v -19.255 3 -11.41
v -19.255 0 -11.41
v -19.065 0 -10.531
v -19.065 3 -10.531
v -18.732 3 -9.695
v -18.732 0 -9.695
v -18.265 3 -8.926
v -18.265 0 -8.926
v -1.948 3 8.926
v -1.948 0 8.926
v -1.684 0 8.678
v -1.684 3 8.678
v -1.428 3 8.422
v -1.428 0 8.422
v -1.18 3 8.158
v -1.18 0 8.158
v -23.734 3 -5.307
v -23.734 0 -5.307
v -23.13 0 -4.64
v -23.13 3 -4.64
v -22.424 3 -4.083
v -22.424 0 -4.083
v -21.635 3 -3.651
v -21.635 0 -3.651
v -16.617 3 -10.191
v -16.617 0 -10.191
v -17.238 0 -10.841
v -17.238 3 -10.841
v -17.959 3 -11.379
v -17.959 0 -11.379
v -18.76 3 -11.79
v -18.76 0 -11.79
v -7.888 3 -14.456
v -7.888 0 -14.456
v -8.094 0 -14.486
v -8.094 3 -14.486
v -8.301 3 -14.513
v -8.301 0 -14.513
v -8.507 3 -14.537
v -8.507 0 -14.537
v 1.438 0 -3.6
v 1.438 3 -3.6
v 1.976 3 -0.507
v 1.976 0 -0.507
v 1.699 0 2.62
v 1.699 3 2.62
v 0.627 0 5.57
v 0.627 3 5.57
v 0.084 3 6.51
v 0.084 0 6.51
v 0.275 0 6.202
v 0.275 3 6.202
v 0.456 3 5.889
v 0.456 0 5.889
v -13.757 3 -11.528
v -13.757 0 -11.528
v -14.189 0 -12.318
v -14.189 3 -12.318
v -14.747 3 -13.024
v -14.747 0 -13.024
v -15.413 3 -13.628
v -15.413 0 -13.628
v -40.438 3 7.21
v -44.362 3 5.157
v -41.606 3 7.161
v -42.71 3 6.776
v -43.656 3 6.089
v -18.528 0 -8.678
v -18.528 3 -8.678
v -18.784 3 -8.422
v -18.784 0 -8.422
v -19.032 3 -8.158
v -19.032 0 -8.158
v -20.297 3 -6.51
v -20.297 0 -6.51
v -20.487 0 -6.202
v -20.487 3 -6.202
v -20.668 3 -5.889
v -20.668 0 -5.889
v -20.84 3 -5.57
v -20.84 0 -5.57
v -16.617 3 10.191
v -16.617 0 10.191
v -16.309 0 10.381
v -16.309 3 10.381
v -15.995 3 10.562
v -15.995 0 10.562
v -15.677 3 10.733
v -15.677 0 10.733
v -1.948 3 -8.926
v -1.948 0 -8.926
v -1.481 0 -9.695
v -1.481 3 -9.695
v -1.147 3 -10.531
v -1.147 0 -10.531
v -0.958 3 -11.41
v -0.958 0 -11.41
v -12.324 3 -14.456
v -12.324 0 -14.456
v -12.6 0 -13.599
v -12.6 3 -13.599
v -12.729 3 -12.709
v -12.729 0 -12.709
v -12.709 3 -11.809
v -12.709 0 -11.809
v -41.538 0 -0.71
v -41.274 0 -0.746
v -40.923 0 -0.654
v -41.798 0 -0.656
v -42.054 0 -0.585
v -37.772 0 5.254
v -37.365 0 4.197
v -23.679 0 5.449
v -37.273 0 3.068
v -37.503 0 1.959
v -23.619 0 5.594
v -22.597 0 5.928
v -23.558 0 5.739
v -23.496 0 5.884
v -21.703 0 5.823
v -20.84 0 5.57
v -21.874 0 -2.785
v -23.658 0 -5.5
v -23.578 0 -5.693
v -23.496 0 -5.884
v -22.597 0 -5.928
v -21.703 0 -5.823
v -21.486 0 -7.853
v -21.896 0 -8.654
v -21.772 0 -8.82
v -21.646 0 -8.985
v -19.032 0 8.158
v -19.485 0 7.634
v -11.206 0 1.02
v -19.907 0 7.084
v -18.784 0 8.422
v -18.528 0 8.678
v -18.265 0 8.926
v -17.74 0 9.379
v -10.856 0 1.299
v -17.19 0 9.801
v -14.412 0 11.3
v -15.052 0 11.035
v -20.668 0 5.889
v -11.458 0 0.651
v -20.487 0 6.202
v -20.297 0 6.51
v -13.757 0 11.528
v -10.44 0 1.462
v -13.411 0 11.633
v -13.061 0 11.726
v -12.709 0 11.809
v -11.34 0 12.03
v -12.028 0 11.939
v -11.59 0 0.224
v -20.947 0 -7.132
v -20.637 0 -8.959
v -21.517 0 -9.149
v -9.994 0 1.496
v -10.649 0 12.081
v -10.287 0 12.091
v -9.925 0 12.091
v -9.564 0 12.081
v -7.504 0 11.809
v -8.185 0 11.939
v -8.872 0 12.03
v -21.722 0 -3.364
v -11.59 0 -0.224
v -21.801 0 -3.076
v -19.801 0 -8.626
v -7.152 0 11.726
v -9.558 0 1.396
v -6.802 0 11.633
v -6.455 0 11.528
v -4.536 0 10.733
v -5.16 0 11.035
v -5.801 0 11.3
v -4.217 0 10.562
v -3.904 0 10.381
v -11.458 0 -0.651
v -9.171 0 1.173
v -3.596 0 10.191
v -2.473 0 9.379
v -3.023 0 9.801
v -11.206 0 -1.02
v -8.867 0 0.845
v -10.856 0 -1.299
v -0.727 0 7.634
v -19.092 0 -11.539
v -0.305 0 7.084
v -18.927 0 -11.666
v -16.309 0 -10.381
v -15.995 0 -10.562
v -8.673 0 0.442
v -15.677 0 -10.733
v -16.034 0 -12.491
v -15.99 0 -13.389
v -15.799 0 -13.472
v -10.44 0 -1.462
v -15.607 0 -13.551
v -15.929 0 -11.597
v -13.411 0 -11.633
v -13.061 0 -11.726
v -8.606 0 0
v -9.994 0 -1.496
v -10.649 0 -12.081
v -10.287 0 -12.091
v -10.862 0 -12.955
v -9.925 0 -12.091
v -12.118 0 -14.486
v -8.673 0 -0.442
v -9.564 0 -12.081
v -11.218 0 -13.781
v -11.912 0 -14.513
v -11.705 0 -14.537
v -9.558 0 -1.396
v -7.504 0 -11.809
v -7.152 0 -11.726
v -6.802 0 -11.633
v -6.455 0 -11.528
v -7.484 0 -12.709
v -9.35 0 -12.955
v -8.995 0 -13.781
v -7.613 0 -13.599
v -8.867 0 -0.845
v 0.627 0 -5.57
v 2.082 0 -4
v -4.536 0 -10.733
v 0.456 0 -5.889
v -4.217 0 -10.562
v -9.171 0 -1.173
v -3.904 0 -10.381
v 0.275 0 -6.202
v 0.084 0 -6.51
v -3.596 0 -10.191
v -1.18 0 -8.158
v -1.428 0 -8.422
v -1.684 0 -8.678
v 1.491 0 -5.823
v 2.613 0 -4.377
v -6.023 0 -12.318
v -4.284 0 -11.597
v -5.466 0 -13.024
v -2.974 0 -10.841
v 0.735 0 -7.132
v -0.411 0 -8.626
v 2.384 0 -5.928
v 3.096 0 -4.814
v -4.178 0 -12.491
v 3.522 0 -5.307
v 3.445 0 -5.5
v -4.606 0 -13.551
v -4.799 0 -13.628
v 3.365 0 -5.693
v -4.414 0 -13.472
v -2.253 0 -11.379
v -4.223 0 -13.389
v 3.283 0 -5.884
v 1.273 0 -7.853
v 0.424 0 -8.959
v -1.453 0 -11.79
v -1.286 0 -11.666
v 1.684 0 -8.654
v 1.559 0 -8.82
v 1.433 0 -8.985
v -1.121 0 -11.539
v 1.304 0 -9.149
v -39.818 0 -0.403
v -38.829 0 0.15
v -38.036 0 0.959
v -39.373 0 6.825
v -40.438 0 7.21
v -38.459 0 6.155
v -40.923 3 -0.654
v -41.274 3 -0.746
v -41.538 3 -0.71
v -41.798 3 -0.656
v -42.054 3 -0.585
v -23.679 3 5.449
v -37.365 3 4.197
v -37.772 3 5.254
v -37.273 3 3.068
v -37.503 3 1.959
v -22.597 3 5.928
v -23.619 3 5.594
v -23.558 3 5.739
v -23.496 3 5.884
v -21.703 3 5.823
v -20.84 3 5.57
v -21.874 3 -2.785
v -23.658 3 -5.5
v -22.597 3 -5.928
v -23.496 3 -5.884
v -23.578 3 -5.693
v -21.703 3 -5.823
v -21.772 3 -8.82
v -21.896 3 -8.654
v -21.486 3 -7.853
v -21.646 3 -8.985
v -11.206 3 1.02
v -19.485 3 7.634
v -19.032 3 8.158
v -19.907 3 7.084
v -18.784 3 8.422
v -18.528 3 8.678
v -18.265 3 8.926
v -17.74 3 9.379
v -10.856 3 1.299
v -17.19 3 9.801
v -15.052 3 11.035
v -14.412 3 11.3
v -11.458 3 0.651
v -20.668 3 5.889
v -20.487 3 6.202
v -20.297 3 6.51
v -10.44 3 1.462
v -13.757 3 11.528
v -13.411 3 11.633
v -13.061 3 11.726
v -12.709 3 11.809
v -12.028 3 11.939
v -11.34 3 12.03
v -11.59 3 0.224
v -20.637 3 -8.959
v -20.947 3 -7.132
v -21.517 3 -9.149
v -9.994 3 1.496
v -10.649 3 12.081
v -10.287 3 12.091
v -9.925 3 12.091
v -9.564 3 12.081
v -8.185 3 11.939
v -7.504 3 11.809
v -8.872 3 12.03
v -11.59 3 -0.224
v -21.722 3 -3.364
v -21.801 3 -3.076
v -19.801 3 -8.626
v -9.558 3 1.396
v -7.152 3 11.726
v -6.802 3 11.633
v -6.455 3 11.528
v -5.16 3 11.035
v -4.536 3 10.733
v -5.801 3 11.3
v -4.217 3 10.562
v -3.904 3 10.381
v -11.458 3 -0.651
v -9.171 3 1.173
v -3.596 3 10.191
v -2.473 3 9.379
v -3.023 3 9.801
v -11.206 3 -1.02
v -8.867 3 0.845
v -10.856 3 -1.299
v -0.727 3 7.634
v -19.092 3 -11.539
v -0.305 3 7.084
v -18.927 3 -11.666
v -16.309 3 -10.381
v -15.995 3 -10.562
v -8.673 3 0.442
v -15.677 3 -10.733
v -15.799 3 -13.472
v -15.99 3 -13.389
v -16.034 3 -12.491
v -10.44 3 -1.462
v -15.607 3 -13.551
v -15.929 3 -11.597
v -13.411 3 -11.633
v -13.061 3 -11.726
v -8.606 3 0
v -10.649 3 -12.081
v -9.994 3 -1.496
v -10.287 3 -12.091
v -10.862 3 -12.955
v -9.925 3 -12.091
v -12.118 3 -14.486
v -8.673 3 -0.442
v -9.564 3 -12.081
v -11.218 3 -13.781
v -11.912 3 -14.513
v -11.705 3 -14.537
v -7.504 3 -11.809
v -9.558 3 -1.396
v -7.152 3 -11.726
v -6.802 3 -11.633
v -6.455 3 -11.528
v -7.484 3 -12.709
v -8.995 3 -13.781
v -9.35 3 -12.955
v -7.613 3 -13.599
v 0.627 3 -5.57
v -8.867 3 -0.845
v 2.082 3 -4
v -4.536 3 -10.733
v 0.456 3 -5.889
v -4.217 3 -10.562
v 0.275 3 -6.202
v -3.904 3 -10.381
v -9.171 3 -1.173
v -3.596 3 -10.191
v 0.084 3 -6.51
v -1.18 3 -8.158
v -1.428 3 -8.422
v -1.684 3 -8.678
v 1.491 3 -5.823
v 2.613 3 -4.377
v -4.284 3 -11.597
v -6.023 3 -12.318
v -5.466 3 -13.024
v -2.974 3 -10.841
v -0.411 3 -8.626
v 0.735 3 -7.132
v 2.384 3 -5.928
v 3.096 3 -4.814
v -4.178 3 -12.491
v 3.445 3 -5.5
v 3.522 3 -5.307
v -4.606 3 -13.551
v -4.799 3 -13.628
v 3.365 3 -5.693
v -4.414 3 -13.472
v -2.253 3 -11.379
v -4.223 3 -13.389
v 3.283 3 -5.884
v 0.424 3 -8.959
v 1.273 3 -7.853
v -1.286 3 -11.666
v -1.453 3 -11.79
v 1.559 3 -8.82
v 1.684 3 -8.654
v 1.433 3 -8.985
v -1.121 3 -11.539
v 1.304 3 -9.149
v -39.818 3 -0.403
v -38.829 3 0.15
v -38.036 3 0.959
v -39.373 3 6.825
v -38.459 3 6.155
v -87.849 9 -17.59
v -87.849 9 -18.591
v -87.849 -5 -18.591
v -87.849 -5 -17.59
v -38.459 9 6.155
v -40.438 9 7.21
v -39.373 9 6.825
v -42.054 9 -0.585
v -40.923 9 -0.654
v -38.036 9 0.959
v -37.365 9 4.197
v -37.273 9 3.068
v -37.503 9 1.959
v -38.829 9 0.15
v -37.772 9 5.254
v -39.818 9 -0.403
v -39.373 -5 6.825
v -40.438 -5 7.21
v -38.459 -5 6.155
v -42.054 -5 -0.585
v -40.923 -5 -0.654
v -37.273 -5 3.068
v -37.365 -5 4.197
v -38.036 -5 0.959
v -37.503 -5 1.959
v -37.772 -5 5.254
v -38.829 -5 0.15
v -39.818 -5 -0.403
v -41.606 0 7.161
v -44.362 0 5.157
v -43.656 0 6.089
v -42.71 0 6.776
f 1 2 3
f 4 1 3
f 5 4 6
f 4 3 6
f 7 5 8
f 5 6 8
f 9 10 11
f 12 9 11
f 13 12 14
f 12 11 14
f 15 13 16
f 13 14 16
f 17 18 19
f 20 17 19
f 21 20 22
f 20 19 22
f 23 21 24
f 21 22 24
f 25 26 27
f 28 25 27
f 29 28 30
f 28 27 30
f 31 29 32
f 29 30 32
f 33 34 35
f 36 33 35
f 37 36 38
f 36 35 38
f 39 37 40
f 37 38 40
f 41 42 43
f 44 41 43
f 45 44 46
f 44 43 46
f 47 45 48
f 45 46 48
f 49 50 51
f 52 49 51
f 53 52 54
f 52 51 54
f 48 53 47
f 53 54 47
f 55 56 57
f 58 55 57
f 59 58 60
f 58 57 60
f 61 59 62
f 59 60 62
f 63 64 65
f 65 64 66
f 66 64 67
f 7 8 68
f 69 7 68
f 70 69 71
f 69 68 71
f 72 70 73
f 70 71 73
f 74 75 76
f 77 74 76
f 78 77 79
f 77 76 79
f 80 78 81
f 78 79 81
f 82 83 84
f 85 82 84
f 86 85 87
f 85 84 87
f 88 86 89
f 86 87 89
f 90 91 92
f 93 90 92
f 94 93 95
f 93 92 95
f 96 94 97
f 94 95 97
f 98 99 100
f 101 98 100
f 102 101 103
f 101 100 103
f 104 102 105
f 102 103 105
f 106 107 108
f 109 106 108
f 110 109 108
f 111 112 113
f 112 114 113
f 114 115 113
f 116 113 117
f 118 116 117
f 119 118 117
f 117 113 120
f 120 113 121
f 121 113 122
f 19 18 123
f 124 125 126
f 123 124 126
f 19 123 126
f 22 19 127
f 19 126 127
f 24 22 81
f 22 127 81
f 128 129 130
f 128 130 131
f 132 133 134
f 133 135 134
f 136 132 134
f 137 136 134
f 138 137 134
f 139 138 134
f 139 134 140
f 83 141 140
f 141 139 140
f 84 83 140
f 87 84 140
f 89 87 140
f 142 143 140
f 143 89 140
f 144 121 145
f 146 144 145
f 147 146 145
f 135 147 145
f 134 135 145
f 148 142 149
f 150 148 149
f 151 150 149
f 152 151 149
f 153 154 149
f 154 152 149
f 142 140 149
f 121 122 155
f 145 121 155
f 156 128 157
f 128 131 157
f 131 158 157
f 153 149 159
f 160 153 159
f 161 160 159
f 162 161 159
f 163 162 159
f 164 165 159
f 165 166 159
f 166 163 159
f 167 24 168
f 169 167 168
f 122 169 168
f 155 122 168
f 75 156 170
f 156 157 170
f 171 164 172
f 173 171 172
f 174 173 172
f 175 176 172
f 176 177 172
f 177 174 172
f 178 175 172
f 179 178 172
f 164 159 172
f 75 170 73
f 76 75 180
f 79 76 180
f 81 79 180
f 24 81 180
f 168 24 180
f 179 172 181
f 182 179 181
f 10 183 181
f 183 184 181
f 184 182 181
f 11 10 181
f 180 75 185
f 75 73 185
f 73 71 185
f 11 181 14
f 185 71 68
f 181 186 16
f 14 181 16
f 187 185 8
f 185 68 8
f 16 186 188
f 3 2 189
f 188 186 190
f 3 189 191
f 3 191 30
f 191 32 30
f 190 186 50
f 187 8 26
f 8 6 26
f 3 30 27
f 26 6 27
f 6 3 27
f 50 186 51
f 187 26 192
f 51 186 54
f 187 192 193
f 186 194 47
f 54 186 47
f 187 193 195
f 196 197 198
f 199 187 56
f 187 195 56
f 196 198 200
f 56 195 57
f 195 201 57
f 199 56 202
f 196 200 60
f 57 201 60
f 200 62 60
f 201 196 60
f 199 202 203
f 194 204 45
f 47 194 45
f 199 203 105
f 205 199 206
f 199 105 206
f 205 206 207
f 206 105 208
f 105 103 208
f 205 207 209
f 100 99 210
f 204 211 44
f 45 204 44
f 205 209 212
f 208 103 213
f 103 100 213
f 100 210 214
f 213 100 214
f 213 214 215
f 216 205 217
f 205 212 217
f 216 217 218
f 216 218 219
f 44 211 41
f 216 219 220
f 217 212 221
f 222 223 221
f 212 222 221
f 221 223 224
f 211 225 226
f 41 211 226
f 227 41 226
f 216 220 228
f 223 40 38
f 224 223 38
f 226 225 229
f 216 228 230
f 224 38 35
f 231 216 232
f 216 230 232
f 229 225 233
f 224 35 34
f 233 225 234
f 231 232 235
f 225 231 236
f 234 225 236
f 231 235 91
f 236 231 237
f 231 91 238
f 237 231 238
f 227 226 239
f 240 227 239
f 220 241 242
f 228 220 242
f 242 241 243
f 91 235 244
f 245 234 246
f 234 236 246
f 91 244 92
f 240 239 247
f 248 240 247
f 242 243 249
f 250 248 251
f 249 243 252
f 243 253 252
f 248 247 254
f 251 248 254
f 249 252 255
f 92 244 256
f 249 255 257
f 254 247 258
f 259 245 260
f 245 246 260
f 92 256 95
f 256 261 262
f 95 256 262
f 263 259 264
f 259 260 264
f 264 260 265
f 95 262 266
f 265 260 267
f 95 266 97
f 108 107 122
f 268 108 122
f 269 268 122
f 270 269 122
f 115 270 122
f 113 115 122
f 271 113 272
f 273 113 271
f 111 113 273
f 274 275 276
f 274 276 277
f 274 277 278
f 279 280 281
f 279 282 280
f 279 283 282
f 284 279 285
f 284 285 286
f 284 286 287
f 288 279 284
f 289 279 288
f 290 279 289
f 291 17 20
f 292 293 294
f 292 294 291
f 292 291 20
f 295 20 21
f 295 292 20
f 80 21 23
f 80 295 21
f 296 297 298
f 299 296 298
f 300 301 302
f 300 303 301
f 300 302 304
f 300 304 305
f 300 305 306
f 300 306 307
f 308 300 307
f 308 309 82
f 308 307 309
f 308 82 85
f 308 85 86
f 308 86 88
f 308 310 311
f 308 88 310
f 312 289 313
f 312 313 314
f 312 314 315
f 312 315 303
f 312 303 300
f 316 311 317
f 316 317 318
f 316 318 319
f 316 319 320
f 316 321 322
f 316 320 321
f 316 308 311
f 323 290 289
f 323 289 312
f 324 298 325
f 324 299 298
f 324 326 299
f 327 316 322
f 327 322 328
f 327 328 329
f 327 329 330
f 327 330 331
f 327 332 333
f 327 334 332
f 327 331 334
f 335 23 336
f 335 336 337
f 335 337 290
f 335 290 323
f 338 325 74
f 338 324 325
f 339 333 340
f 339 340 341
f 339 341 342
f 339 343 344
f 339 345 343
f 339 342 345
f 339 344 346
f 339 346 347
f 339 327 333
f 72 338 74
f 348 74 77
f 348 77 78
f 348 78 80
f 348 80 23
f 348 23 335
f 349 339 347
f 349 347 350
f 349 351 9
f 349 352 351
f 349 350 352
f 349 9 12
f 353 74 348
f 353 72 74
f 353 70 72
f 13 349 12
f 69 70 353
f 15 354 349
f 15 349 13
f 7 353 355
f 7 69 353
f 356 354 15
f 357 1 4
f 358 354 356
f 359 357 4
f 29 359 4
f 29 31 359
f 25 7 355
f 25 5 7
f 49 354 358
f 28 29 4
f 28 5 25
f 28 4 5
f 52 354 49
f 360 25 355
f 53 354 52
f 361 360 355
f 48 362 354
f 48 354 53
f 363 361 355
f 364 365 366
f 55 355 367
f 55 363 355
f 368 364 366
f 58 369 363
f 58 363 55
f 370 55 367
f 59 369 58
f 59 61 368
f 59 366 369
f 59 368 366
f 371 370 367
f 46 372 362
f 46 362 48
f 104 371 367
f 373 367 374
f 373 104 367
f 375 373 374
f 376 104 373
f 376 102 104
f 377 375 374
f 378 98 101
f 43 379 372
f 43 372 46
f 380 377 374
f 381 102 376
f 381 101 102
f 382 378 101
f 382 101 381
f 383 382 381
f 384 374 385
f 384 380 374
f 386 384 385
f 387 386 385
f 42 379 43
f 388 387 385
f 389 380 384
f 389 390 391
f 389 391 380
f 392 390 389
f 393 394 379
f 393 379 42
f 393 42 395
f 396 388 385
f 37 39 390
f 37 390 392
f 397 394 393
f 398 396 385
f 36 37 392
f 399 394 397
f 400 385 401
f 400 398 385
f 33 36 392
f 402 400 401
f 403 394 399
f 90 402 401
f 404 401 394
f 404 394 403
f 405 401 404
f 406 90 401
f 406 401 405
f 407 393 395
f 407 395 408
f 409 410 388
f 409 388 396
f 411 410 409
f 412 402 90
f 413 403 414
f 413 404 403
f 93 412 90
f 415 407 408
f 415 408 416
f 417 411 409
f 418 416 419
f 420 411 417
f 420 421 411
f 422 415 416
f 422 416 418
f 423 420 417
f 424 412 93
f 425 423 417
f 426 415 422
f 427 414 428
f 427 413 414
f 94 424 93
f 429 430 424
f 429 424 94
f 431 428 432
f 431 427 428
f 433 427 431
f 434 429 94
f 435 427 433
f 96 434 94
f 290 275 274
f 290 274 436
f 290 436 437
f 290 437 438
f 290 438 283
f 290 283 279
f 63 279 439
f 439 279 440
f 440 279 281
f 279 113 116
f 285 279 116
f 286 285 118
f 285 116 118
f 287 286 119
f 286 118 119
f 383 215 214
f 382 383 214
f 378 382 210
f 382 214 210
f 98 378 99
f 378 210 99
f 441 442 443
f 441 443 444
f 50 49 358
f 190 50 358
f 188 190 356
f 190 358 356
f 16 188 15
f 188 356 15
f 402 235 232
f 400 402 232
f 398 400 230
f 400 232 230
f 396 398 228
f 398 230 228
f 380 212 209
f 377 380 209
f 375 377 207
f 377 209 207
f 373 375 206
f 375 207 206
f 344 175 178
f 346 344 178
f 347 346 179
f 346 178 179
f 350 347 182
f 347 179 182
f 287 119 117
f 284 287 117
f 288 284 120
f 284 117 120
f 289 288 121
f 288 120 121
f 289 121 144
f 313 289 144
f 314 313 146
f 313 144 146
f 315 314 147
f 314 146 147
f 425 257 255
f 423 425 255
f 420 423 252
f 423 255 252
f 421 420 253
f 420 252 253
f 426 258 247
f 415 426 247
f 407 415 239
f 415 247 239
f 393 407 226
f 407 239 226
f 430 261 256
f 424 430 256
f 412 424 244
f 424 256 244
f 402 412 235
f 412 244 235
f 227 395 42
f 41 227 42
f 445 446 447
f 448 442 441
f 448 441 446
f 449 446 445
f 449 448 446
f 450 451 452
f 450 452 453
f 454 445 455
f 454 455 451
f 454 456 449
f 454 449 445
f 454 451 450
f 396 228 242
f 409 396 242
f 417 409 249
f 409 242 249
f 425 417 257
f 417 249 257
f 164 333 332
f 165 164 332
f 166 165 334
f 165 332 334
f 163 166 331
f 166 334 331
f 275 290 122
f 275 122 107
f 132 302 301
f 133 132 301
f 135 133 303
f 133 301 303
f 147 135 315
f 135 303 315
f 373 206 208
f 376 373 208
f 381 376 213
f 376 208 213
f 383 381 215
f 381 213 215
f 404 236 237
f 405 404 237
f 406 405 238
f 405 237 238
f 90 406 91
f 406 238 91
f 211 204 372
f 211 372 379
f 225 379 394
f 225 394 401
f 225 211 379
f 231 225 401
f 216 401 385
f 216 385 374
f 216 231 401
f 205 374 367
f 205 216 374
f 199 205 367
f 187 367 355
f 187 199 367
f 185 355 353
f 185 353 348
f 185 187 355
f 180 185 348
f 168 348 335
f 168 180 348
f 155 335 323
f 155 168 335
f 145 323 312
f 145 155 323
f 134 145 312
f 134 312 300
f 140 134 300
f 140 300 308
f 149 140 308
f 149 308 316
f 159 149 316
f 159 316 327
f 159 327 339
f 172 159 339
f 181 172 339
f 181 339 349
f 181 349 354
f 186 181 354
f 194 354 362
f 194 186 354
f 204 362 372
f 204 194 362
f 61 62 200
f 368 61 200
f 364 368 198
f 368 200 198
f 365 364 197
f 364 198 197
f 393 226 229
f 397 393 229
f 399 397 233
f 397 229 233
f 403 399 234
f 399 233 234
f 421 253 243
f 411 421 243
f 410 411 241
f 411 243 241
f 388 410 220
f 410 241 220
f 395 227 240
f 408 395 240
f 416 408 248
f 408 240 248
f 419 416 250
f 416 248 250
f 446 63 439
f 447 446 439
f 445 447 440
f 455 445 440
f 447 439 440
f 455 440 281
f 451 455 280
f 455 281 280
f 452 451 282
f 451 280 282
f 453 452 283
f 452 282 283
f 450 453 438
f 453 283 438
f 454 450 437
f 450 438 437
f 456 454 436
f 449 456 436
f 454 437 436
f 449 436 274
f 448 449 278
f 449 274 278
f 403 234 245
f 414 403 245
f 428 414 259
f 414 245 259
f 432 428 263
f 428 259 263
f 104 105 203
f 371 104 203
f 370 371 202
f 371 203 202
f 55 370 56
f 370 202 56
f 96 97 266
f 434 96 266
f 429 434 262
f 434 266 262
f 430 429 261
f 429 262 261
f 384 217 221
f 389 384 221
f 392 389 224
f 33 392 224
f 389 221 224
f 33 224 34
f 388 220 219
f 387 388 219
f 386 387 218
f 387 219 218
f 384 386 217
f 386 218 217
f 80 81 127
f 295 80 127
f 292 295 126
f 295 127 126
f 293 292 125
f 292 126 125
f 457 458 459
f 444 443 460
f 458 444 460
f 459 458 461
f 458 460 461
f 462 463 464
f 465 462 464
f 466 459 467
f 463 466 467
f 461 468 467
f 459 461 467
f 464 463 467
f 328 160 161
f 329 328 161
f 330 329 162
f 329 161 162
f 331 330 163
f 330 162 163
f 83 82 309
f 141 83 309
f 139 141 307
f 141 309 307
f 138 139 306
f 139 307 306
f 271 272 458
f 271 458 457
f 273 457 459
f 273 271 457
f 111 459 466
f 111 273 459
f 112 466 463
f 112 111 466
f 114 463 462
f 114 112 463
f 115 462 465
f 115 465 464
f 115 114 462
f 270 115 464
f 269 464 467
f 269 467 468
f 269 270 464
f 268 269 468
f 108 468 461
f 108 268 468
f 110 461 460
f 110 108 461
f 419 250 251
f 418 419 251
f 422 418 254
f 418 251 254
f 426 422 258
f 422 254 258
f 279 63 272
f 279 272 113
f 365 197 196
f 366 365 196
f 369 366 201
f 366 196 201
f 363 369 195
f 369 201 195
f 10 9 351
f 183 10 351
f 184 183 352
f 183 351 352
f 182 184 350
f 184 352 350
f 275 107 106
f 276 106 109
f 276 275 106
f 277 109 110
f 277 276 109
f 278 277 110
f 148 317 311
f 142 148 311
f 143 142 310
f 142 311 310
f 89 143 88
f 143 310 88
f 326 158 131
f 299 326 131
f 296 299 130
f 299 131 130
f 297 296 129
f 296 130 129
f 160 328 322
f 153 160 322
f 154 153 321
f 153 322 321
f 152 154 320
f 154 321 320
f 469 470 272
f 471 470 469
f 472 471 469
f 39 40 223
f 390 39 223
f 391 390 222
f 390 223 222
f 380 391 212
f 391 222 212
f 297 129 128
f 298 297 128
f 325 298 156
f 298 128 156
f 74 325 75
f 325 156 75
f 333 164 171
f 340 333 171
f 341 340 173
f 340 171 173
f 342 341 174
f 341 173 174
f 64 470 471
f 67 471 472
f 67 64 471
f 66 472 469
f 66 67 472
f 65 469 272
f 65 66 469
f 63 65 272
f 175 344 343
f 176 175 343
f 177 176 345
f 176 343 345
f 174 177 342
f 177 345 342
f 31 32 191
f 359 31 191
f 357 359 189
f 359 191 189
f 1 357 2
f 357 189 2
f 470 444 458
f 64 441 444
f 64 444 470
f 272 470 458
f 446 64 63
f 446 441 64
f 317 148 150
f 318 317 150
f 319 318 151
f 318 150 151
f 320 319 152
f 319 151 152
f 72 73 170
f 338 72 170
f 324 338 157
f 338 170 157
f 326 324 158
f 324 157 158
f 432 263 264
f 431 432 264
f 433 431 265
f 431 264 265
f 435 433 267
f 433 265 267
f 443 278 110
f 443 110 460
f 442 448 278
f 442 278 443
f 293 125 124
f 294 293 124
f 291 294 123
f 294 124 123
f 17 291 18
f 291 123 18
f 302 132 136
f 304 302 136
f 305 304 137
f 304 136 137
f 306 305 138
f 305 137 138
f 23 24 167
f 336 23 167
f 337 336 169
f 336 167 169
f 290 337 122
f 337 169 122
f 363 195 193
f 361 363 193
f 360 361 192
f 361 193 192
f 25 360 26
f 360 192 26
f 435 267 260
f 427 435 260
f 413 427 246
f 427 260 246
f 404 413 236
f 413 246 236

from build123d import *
from build123d.topology import SkipClean

# Parameters (mm, degrees)
SKETCH1_R                = 1.5
BOSS_EXTRUDE1_DEPTH      = 3
BOSS_EXTRUDE2_START      = -3
SKETCH3_R                = 1.5
BOSS_EXTRUDE2_DEPTH      = 3
CUT_EXTRUDE1_START       = -3
CUT_EXTRUDE1_DEPTH       = 3
BOSS_EXTRUDE3_DEPTH      = 6
BOSS_EXTRUDE3_DEPTH_BACK = 8


with BuildPart() as part:
    # Sketch1 → Boss-Extrude1 (new body)
    with BuildSketch(Plane(origin=(0, 0, 0), x_dir=(1, 0, 0), z_dir=(0, 1, 0))):
        with BuildLine():
            Line((20.643657446, 4), (2.081641936, 4))
            ThreePointArc((2.081641936, 4), (2.861028333, 4.588201733), (3.521749436, 5.30713988))
            ThreePointArc((3.521749436, 5.30713988), (3.405395609, 5.596745198), (3.282888305, 5.883801663))
            ThreePointArc((3.282888305, 5.883801663), (1.93527598, 5.894040025), (0.627094961, 5.57027124))
            ThreePointArc((0.627094961, 5.57027124), (0.366286148, 6.046375), (0.084372603, 6.510293938))
            ThreePointArc((0.084372603, 6.510293938), (1.018855105, 7.48132754), (1.683794586, 8.65351323))
            ThreePointArc((1.683794586, 8.65351323), (1.496450048, 8.903135899), (1.303821399, 9.148703928))
            ThreePointArc((1.303821399, 9.148703928), (-0.000522033, 8.809805691), (-1.180330337, 8.158486898))
            ThreePointArc((-1.180330337, 8.158486898), (-1.555477026, 8.550865528), (-1.947855656, 8.926012217))
            ThreePointArc((-1.947855656, 8.926012217), (-1.296536862, 10.105820521), (-0.957638625, 11.410163953))
            ThreePointArc((-0.957638625, 11.410163953), (-1.203206655, 11.602792602), (-1.452829324, 11.79013714))
            ThreePointArc((-1.452829324, 11.79013714), (-2.625015014, 11.125197659), (-3.596048616, 10.190715157))
            ThreePointArc((-3.596048616, 10.190715157), (-4.059967554, 10.472628702), (-4.536071314, 10.733437515))
            ThreePointArc((-4.536071314, 10.733437515), (-4.212302529, 12.041618533), (-4.222540891, 13.389230859))
            ThreePointArc((-4.222540891, 13.389230859), (-4.509597355, 13.511738163), (-4.799202674, 13.62809199))
            ThreePointArc((-4.799202674, 13.62809199), (-5.759348103, 12.682425791), (-6.455432668, 11.528463019))
            ThreePointArc((-6.455432668, 11.528463019), (-6.976508546, 11.680699536), (-7.503891752, 11.809396783))
            ThreePointArc((-7.503891752, 11.809396783), (-7.529737283, 13.156800143), (-7.888414517, 14.455843809))
            ThreePointArc((-7.888414517, 14.455843809), (-8.197396993, 14.499881098), (-8.507248835, 14.537314892))
            ThreePointArc((-8.507248835, 14.537314892), (-9.18992168, 13.375367565), (-9.563620196, 12.080565177))
            ThreePointArc((-9.563620196, 12.080565177), (-10.106342554, 12.09275), (-10.649064912, 12.080565177))
            ThreePointArc((-10.649064912, 12.080565177), (-11.022763428, 13.375367565), (-11.705436272, 14.537314892))
            ThreePointArc((-11.705436272, 14.537314892), (-12.015288115, 14.499881098), (-12.324270591, 14.455843809))
            ThreePointArc((-12.324270591, 14.455843809), (-12.682947825, 13.156800143), (-12.708793355, 11.809396783))
            ThreePointArc((-12.708793355, 11.809396783), (-13.236176561, 11.680699536), (-13.757252439, 11.528463019))
            ThreePointArc((-13.757252439, 11.528463019), (-14.453337005, 12.682425791), (-15.413482434, 13.62809199))
            ThreePointArc((-15.413482434, 13.62809199), (-15.703087752, 13.511738163), (-15.990144217, 13.389230859))
            ThreePointArc((-15.990144217, 13.389230859), (-16.000382579, 12.041618533), (-15.676613793, 10.733437515))
            ThreePointArc((-15.676613793, 10.733437515), (-16.152717554, 10.472628702), (-16.616636492, 10.190715157))
            ThreePointArc((-16.616636492, 10.190715157), (-17.587670094, 11.125197659), (-18.759855783, 11.79013714))
            ThreePointArc((-18.759855783, 11.79013714), (-19.009478453, 11.602792602), (-19.255046482, 11.410163953))
            ThreePointArc((-19.255046482, 11.410163953), (-18.916148245, 10.105820521), (-18.264829452, 8.926012217))
            ThreePointArc((-18.264829452, 8.926012217), (-18.657208082, 8.550865528), (-19.032354771, 8.158486898))
            ThreePointArc((-19.032354771, 8.158486898), (-20.212163074, 8.809805691), (-21.516506507, 9.148703928))
            ThreePointArc((-21.516506507, 9.148703928), (-21.709135156, 8.903135899), (-21.896479694, 8.65351323))
            ThreePointArc((-21.896479694, 8.65351323), (-21.231540213, 7.48132754), (-20.297057711, 6.510293938))
            ThreePointArc((-20.297057711, 6.510293938), (-20.578971255, 6.046375), (-20.839780068, 5.57027124))
            ThreePointArc((-20.839780068, 5.57027124), (-22.147961087, 5.894040025), (-23.495573413, 5.883801663))
            ThreePointArc((-23.495573413, 5.883801663), (-23.618080717, 5.596745198), (-23.734434544, 5.30713988))
            ThreePointArc((-23.734434544, 5.30713988), (-22.788768345, 4.346994451), (-21.634805572, 3.650909885))
            ThreePointArc((-21.634805572, 3.650909885), (-21.78704209, 3.129834008), (-21.915739337, 2.602450802))
            ThreePointArc((-21.915739337, 2.602450802), (-23.263142697, 2.576605271), (-24.562186363, 2.217928037))
            ThreePointArc((-24.562186363, 2.217928037), (-24.606223651, 1.908945561), (-24.643657446, 1.599093719))
            ThreePointArc((-24.643657446, 1.599093719), (-23.481710119, 0.916420874), (-22.186907731, 0.542722358))
            ThreePointArc((-22.186907731, 0.542722358), (-22.199092554, 0), (-22.186907731, -0.542722358))
            ThreePointArc((-22.186907731, -0.542722358), (-23.481710119, -0.916420874), (-24.643657446, -1.599093719))
            ThreePointArc((-24.643657446, -1.599093719), (-24.606223651, -1.908945561), (-24.562186363, -2.217928037))
            ThreePointArc((-24.562186363, -2.217928037), (-23.263142697, -2.576605271), (-21.915739337, -2.602450802))
            ThreePointArc((-21.915739337, -2.602450802), (-21.78704209, -3.129834008), (-21.634805572, -3.650909885))
            ThreePointArc((-21.634805572, -3.650909885), (-22.788768345, -4.346994451), (-23.734434544, -5.30713988))
            ThreePointArc((-23.734434544, -5.30713988), (-23.618080717, -5.596745198), (-23.495573413, -5.883801663))
            ThreePointArc((-23.495573413, -5.883801663), (-22.147961087, -5.894040025), (-20.839780068, -5.57027124))
            ThreePointArc((-20.839780068, -5.57027124), (-20.578971255, -6.046375), (-20.297057711, -6.510293938))
            ThreePointArc((-20.297057711, -6.510293938), (-21.231540213, -7.48132754), (-21.896479694, -8.65351323))
            ThreePointArc((-21.896479694, -8.65351323), (-21.709135156, -8.903135899), (-21.516506507, -9.148703928))
            ThreePointArc((-21.516506507, -9.148703928), (-20.212163074, -8.809805691), (-19.032354771, -8.158486898))
            ThreePointArc((-19.032354771, -8.158486898), (-18.657208082, -8.550865528), (-18.264829452, -8.926012217))
            ThreePointArc((-18.264829452, -8.926012217), (-18.916148245, -10.105820521), (-19.255046482, -11.410163953))
            ThreePointArc((-19.255046482, -11.410163953), (-19.009478453, -11.602792602), (-18.759855783, -11.79013714))
            ThreePointArc((-18.759855783, -11.79013714), (-17.587670094, -11.125197659), (-16.616636492, -10.190715157))
            ThreePointArc((-16.616636492, -10.190715157), (-16.152717554, -10.472628702), (-15.676613793, -10.733437515))
            ThreePointArc((-15.676613793, -10.733437515), (-16.000382579, -12.041618533), (-15.990144217, -13.389230859))
            ThreePointArc((-15.990144217, -13.389230859), (-15.703087752, -13.511738163), (-15.413482434, -13.62809199))
            ThreePointArc((-15.413482434, -13.62809199), (-14.453337005, -12.682425791), (-13.757252439, -11.528463019))
            ThreePointArc((-13.757252439, -11.528463019), (-13.236176561, -11.680699536), (-12.708793355, -11.809396783))
            ThreePointArc((-12.708793355, -11.809396783), (-12.682947825, -13.156800143), (-12.324270591, -14.455843809))
            ThreePointArc((-12.324270591, -14.455843809), (-12.015288115, -14.499881098), (-11.705436272, -14.537314892))
            ThreePointArc((-11.705436272, -14.537314892), (-11.022763428, -13.375367565), (-10.649064912, -12.080565177))
            ThreePointArc((-10.649064912, -12.080565177), (-10.106342554, -12.09275), (-9.563620196, -12.080565177))
            ThreePointArc((-9.563620196, -12.080565177), (-9.18992168, -13.375367565), (-8.507248835, -14.537314892))
            ThreePointArc((-8.507248835, -14.537314892), (-8.197396993, -14.499881098), (-7.888414517, -14.455843809))
            ThreePointArc((-7.888414517, -14.455843809), (-7.529737283, -13.156800143), (-7.503891752, -11.809396783))
            ThreePointArc((-7.503891752, -11.809396783), (-6.976508546, -11.680699536), (-6.455432668, -11.528463019))
            ThreePointArc((-6.455432668, -11.528463019), (-5.759348103, -12.682425791), (-4.799202674, -13.62809199))
            ThreePointArc((-4.799202674, -13.62809199), (-4.509597355, -13.511738163), (-4.222540891, -13.389230859))
            ThreePointArc((-4.222540891, -13.389230859), (-4.212302529, -12.041618533), (-4.536071314, -10.733437515))
            ThreePointArc((-4.536071314, -10.733437515), (-4.059967554, -10.472628702), (-3.596048616, -10.190715157))
            ThreePointArc((-3.596048616, -10.190715157), (-2.625015014, -11.125197659), (-1.452829324, -11.79013714))
            ThreePointArc((-1.452829324, -11.79013714), (-1.203206655, -11.602792602), (-0.957638625, -11.410163953))
            ThreePointArc((-0.957638625, -11.410163953), (-1.296536862, -10.105820521), (-1.947855656, -8.926012217))
            ThreePointArc((-1.947855656, -8.926012217), (-1.555477026, -8.550865528), (-1.180330337, -8.158486898))
            ThreePointArc((-1.180330337, -8.158486898), (-0.000522033, -8.809805691), (1.303821399, -9.148703928))
            ThreePointArc((1.303821399, -9.148703928), (1.496450048, -8.903135899), (1.683794586, -8.65351323))
            ThreePointArc((1.683794586, -8.65351323), (1.018855105, -7.48132754), (0.084372603, -6.510293938))
            ThreePointArc((0.084372603, -6.510293938), (0.366286148, -6.046375), (0.627094961, -5.57027124))
            ThreePointArc((0.627094961, -5.57027124), (1.93527598, -5.894040025), (3.282888305, -5.883801663))
            ThreePointArc((3.282888305, -5.883801663), (3.405395609, -5.596745198), (3.521749436, -5.30713988))
            ThreePointArc((3.521749436, -5.30713988), (2.861028333, -4.588201733), (2.081641936, -4))
            Line((2.081641936, -4), (20.643657446, -4))
            ThreePointArc((20.643657446, -4), (24.643657446, 0), (20.643657446, 4))
        make_face()
        with Locations((-10.106342554, 0)):
            Circle(SKETCH1_R, mode=Mode.SUBTRACT)
        with Locations((20.643657446, 0)):
            Circle(SKETCH1_R, mode=Mode.SUBTRACT)
    extrude(amount=BOSS_EXTRUDE1_DEPTH)

    # Sketch3 → Boss-Extrude2 (add)
    with BuildSketch(Plane(origin=(0, 3, 0), x_dir=(1, 0, 0), z_dir=(0, 1, 0)).offset(BOSS_EXTRUDE2_START)):
        with BuildLine():
            Line((-10.524456407, 3.978087581), (-41.274456407, 0.746132347))
            ThreePointArc((-41.274456407, 0.746132347), (-44.834430135, -3.650069087), (-40.438228701, -7.210042816))
            Line((-40.438228701, -7.210042816), (-9.688228701, -3.978087581))
            ThreePointArc((-9.688228701, -3.978087581), (-6.128254972, 0.418113853), (-10.524456407, 3.978087581))
        make_face()
        with Locations((-10.106342554, 0)):
            Circle(SKETCH3_R, mode=Mode.SUBTRACT)
        with Locations((-40.856342554, -3.231955234)):
            Circle(SKETCH3_R, mode=Mode.SUBTRACT)
    extrude(amount=BOSS_EXTRUDE2_DEPTH)

    # Sketch4 → Cut-Extrude1 (cut)
    with SkipClean():  # the faces are left unmerged after this step: merging them gives an invalid solid
        with BuildSketch(Plane(origin=(0, 3, 0), x_dir=(1, 0, 0), z_dir=(0, 1, 0)).offset(CUT_EXTRUDE1_START)):
            with BuildLine():
                ThreePointArc((20.643657446, -4), (24.643657446, 0), (20.643657446, 4))
                Line((20.643657446, 4), (2.081641936, 4))
                Line((2.081641936, 4), (1.43808022, 3.600125745))
                ThreePointArc((1.43808022, 3.600125745), (1.939395696, -1.065266441), (0.627094961, -5.57027124))
                ThreePointArc((0.627094961, -5.57027124), (1.93527598, -5.894040025), (3.282888305, -5.883801663))
                ThreePointArc((3.282888305, -5.883801663), (3.405395609, -5.596745198), (3.521749436, -5.30713988))
                ThreePointArc((3.521749436, -5.30713988), (2.861028333, -4.588201733), (2.081641936, -4))
                Line((2.081641936, -4), (20.643657446, -4))
            make_face()
            with BuildLine():
                ThreePointArc((1.683794586, -8.65351323), (1.018855105, -7.48132754), (0.084372603, -6.510293938))
                ThreePointArc((0.084372603, -6.510293938), (-0.512518948, -7.361599771), (-1.180330337, -8.158486898))
                ThreePointArc((-1.180330337, -8.158486898), (-0.000522033, -8.809805691), (1.303821399, -9.148703928))
                ThreePointArc((1.303821399, -9.148703928), (1.496450048, -8.903135899), (1.683794586, -8.65351323))
            make_face()
            with BuildLine():
                ThreePointArc((-0.957638625, -11.410163953), (-1.296536862, -10.105820521), (-1.947855656, -8.926012217))
                ThreePointArc((-1.947855656, -8.926012217), (-2.744742783, -9.593823606), (-3.596048616, -10.190715157))
                ThreePointArc((-3.596048616, -10.190715157), (-2.625015014, -11.125197659), (-1.452829324, -11.79013714))
                ThreePointArc((-1.452829324, -11.79013714), (-1.203206655, -11.602792602), (-0.957638625, -11.410163953))
            make_face()
            with BuildLine():
                ThreePointArc((-4.222540891, -13.389230859), (-4.212302529, -12.041618533), (-4.536071314, -10.733437515))
                ThreePointArc((-4.536071314, -10.733437515), (-5.478647477, -11.172244217), (-6.455432668, -11.528463019))
                ThreePointArc((-6.455432668, -11.528463019), (-5.759348103, -12.682425791), (-4.799202674, -13.62809199))
                ThreePointArc((-4.799202674, -13.62809199), (-4.509597355, -13.511738163), (-4.222540891, -13.389230859))
            make_face()
            with BuildLine():
                ThreePointArc((-7.888414517, -14.455843809), (-7.529737283, -13.156800143), (-7.503891752, -11.809396783))
                ThreePointArc((-7.503891752, -11.809396783), (-8.527921943, -11.989294847), (-9.563620196, -12.080565177))
                ThreePointArc((-9.563620196, -12.080565177), (-9.18992168, -13.375367565), (-8.507248835, -14.537314892))
                ThreePointArc((-8.507248835, -14.537314892), (-8.197396993, -14.499881098), (-7.888414517, -14.455843809))
            make_face()
            with BuildLine():
                ThreePointArc((-11.705436272, -14.537314892), (-11.022763428, -13.375367565), (-10.649064912, -12.080565177))
                ThreePointArc((-10.649064912, -12.080565177), (-11.684763165, -11.989294847), (-12.708793355, -11.809396783))
                ThreePointArc((-12.708793355, -11.809396783), (-12.682947825, -13.156800143), (-12.324270591, -14.455843809))
                ThreePointArc((-12.324270591, -14.455843809), (-12.015288115, -14.499881098), (-11.705436272, -14.537314892))
            make_face()
            with BuildLine():
                ThreePointArc((-15.413482434, -13.62809199), (-14.453337005, -12.682425791), (-13.757252439, -11.528463019))
                ThreePointArc((-13.757252439, -11.528463019), (-14.734037631, -11.172244217), (-15.676613793, -10.733437515))
                ThreePointArc((-15.676613793, -10.733437515), (-16.000382579, -12.041618533), (-15.990144217, -13.389230859))
                ThreePointArc((-15.990144217, -13.389230859), (-15.703087752, -13.511738163), (-15.413482434, -13.62809199))
            make_face()
            with BuildLine():
                ThreePointArc((-18.759855783, -11.79013714), (-17.587670094, -11.125197659), (-16.616636492, -10.190715157))
                ThreePointArc((-16.616636492, -10.190715157), (-17.467942324, -9.593823606), (-18.264829452, -8.926012217))
                ThreePointArc((-18.264829452, -8.926012217), (-18.916148245, -10.105820521), (-19.255046482, -11.410163953))
                ThreePointArc((-19.255046482, -11.410163953), (-19.009478453, -11.602792602), (-18.759855783, -11.79013714))
            make_face()
            with BuildLine():
                ThreePointArc((-21.516506507, -9.148703928), (-20.212163074, -8.809805691), (-19.032354771, -8.158486898))
                ThreePointArc((-19.032354771, -8.158486898), (-19.70016616, -7.361599771), (-20.297057711, -6.510293938))
                ThreePointArc((-20.297057711, -6.510293938), (-21.231540213, -7.48132754), (-21.896479694, -8.65351323))
                ThreePointArc((-21.896479694, -8.65351323), (-21.709135156, -8.903135899), (-21.516506507, -9.148703928))
            make_face()
        extrude(amount=CUT_EXTRUDE1_DEPTH, mode=Mode.SUBTRACT)

    # Sketch5 → Boss-Extrude3 (add, two sides: drawn at the far end of the back side and taken through both)
    with SkipClean():  # the faces are left unmerged after this step: merging them gives an invalid solid
        with BuildSketch(Plane(origin=(0, 3, 0), x_dir=(1, 0, 0), z_dir=(0, 1, 0)).offset(-BOSS_EXTRUDE3_DEPTH_BACK)):
            with BuildLine():
                Line((-42.053620407, 0.58465658), (-87.849323809, 18.590837409))
                Line((-87.849323809, 18.590837409), (-87.849323809, 17.589536845))
                Line((-87.849323809, 17.589536845), (-40.438228701, -7.210042816))
                ThreePointArc((-40.438228701, -7.210042816), (-37.348574856, -2.504997265), (-42.053620407, 0.58465658))
            make_face()
        extrude(amount=BOSS_EXTRUDE3_DEPTH + BOSS_EXTRUDE3_DEPTH_BACK)


solid = part.part
